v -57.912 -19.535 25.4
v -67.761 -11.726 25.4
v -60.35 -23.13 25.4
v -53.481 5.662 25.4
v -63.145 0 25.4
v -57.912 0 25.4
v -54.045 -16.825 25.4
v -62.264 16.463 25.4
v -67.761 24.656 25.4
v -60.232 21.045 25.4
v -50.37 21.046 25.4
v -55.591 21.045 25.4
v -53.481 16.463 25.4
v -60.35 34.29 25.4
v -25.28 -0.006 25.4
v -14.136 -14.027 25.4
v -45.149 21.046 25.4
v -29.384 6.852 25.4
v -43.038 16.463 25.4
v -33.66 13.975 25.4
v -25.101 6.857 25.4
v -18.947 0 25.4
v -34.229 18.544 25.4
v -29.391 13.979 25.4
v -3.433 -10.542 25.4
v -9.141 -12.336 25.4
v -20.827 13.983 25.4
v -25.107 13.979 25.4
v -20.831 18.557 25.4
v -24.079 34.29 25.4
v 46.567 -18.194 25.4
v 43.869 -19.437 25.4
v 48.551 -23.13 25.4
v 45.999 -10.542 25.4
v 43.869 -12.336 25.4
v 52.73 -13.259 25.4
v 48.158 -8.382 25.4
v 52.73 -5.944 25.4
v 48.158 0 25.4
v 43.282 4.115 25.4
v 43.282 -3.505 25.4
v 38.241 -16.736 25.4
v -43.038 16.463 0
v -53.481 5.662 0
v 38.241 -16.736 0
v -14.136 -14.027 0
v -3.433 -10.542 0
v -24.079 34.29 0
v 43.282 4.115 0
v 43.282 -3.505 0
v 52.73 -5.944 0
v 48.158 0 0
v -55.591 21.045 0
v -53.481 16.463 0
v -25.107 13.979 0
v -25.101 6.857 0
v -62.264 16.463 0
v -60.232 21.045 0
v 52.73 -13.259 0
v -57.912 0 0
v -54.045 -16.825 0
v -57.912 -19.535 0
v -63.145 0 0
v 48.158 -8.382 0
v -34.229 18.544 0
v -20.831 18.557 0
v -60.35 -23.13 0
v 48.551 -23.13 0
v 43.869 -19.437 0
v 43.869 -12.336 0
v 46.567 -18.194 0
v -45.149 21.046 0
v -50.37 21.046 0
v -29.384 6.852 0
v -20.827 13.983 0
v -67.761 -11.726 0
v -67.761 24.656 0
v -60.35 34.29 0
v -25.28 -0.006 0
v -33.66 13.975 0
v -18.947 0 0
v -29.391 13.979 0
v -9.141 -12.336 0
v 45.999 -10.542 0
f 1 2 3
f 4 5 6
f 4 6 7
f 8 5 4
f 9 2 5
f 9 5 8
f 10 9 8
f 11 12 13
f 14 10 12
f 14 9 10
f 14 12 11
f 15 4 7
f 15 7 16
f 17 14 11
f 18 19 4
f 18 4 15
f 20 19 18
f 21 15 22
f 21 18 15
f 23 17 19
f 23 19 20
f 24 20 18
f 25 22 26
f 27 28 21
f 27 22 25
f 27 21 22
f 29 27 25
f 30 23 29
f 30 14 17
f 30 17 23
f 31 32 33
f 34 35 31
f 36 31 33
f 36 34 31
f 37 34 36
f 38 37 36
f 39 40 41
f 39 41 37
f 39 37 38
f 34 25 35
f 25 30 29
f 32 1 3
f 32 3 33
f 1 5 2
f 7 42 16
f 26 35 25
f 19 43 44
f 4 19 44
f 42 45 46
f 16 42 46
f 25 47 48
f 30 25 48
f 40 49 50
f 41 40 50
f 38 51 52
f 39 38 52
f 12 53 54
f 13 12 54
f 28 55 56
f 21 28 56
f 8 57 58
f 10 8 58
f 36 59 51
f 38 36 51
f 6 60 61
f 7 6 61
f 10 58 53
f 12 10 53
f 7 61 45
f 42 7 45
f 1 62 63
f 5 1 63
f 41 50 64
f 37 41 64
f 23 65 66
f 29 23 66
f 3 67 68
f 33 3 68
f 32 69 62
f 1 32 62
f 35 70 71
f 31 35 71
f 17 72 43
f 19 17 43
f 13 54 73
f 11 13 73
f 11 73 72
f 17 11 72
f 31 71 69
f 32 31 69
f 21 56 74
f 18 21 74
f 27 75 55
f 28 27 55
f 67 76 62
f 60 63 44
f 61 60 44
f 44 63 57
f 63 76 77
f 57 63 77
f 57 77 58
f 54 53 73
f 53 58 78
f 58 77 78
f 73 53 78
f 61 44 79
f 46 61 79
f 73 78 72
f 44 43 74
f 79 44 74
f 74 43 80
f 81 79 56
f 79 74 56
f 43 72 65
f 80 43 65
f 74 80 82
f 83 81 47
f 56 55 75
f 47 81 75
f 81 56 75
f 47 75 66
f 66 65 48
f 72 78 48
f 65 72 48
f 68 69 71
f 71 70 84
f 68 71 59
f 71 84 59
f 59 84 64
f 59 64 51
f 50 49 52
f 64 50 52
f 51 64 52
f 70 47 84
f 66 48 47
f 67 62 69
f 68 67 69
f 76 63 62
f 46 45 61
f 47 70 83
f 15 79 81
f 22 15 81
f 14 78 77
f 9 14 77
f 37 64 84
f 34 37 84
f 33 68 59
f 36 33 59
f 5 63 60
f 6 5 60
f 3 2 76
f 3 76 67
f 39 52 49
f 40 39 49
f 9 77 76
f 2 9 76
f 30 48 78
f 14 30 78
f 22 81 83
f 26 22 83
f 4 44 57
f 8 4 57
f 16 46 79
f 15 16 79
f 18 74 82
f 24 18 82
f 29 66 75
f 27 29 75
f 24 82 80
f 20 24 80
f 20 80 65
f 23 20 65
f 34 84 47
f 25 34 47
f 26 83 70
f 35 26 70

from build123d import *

# Parameters (mm, degrees)
F1_DEPTH = 25.4


with BuildPart() as f1:
    # F0 (on Top) → F1 (new body)
    with BuildSketch(Plane.XY):
        Polygon((-24.0792, 34.290001), (-60.350399, 34.290001), (-67.761458, 24.655646), (-67.761458, -11.726021), (-60.350399, -23.129791), (48.551362, -23.129791), (52.7304, -13.2588), (52.7304, -5.9436), (48.1584, 0), (43.2816, 4.1148), (43.2816, -3.5052), (48.1584, -8.382), (45.998619, -10.54178), (-3.432985, -10.54178), align=None)
        Polygon((-57.912, -19.534851), (-63.144549, 0), (-57.912, 0), (-54.045353, -16.82521), (38.240661, -16.736207), (-14.135674, -14.026972), (-25.280462, -0.006108), (-18.946942, 0), (-9.141184, -12.336277), (43.86873, -12.336277), (46.566502, -18.194295), (43.86873, -19.43669), align=None, mode=Mode.SUBTRACT)
        Polygon((-62.263511, 16.462522), (-60.232367, 21.044958), (-55.59146, 21.044958), (-53.481128, 16.462522), (-50.370198, 21.045681), (-45.148745, 21.045681), (-43.03808, 16.462522), (-53.481128, 5.661911), align=None, mode=Mode.SUBTRACT)
        Polygon((-33.659617, 13.975172), (-34.229498, 18.544318), (-20.831046, 18.55724), (-20.826635, 13.983417), (-25.107411, 13.979289), (-25.100542, 6.856575), (-29.384067, 6.852444), (-29.39094, 13.979289), align=None, mode=Mode.SUBTRACT)
    extrude(amount=F1_DEPTH)


solid = f1.part
